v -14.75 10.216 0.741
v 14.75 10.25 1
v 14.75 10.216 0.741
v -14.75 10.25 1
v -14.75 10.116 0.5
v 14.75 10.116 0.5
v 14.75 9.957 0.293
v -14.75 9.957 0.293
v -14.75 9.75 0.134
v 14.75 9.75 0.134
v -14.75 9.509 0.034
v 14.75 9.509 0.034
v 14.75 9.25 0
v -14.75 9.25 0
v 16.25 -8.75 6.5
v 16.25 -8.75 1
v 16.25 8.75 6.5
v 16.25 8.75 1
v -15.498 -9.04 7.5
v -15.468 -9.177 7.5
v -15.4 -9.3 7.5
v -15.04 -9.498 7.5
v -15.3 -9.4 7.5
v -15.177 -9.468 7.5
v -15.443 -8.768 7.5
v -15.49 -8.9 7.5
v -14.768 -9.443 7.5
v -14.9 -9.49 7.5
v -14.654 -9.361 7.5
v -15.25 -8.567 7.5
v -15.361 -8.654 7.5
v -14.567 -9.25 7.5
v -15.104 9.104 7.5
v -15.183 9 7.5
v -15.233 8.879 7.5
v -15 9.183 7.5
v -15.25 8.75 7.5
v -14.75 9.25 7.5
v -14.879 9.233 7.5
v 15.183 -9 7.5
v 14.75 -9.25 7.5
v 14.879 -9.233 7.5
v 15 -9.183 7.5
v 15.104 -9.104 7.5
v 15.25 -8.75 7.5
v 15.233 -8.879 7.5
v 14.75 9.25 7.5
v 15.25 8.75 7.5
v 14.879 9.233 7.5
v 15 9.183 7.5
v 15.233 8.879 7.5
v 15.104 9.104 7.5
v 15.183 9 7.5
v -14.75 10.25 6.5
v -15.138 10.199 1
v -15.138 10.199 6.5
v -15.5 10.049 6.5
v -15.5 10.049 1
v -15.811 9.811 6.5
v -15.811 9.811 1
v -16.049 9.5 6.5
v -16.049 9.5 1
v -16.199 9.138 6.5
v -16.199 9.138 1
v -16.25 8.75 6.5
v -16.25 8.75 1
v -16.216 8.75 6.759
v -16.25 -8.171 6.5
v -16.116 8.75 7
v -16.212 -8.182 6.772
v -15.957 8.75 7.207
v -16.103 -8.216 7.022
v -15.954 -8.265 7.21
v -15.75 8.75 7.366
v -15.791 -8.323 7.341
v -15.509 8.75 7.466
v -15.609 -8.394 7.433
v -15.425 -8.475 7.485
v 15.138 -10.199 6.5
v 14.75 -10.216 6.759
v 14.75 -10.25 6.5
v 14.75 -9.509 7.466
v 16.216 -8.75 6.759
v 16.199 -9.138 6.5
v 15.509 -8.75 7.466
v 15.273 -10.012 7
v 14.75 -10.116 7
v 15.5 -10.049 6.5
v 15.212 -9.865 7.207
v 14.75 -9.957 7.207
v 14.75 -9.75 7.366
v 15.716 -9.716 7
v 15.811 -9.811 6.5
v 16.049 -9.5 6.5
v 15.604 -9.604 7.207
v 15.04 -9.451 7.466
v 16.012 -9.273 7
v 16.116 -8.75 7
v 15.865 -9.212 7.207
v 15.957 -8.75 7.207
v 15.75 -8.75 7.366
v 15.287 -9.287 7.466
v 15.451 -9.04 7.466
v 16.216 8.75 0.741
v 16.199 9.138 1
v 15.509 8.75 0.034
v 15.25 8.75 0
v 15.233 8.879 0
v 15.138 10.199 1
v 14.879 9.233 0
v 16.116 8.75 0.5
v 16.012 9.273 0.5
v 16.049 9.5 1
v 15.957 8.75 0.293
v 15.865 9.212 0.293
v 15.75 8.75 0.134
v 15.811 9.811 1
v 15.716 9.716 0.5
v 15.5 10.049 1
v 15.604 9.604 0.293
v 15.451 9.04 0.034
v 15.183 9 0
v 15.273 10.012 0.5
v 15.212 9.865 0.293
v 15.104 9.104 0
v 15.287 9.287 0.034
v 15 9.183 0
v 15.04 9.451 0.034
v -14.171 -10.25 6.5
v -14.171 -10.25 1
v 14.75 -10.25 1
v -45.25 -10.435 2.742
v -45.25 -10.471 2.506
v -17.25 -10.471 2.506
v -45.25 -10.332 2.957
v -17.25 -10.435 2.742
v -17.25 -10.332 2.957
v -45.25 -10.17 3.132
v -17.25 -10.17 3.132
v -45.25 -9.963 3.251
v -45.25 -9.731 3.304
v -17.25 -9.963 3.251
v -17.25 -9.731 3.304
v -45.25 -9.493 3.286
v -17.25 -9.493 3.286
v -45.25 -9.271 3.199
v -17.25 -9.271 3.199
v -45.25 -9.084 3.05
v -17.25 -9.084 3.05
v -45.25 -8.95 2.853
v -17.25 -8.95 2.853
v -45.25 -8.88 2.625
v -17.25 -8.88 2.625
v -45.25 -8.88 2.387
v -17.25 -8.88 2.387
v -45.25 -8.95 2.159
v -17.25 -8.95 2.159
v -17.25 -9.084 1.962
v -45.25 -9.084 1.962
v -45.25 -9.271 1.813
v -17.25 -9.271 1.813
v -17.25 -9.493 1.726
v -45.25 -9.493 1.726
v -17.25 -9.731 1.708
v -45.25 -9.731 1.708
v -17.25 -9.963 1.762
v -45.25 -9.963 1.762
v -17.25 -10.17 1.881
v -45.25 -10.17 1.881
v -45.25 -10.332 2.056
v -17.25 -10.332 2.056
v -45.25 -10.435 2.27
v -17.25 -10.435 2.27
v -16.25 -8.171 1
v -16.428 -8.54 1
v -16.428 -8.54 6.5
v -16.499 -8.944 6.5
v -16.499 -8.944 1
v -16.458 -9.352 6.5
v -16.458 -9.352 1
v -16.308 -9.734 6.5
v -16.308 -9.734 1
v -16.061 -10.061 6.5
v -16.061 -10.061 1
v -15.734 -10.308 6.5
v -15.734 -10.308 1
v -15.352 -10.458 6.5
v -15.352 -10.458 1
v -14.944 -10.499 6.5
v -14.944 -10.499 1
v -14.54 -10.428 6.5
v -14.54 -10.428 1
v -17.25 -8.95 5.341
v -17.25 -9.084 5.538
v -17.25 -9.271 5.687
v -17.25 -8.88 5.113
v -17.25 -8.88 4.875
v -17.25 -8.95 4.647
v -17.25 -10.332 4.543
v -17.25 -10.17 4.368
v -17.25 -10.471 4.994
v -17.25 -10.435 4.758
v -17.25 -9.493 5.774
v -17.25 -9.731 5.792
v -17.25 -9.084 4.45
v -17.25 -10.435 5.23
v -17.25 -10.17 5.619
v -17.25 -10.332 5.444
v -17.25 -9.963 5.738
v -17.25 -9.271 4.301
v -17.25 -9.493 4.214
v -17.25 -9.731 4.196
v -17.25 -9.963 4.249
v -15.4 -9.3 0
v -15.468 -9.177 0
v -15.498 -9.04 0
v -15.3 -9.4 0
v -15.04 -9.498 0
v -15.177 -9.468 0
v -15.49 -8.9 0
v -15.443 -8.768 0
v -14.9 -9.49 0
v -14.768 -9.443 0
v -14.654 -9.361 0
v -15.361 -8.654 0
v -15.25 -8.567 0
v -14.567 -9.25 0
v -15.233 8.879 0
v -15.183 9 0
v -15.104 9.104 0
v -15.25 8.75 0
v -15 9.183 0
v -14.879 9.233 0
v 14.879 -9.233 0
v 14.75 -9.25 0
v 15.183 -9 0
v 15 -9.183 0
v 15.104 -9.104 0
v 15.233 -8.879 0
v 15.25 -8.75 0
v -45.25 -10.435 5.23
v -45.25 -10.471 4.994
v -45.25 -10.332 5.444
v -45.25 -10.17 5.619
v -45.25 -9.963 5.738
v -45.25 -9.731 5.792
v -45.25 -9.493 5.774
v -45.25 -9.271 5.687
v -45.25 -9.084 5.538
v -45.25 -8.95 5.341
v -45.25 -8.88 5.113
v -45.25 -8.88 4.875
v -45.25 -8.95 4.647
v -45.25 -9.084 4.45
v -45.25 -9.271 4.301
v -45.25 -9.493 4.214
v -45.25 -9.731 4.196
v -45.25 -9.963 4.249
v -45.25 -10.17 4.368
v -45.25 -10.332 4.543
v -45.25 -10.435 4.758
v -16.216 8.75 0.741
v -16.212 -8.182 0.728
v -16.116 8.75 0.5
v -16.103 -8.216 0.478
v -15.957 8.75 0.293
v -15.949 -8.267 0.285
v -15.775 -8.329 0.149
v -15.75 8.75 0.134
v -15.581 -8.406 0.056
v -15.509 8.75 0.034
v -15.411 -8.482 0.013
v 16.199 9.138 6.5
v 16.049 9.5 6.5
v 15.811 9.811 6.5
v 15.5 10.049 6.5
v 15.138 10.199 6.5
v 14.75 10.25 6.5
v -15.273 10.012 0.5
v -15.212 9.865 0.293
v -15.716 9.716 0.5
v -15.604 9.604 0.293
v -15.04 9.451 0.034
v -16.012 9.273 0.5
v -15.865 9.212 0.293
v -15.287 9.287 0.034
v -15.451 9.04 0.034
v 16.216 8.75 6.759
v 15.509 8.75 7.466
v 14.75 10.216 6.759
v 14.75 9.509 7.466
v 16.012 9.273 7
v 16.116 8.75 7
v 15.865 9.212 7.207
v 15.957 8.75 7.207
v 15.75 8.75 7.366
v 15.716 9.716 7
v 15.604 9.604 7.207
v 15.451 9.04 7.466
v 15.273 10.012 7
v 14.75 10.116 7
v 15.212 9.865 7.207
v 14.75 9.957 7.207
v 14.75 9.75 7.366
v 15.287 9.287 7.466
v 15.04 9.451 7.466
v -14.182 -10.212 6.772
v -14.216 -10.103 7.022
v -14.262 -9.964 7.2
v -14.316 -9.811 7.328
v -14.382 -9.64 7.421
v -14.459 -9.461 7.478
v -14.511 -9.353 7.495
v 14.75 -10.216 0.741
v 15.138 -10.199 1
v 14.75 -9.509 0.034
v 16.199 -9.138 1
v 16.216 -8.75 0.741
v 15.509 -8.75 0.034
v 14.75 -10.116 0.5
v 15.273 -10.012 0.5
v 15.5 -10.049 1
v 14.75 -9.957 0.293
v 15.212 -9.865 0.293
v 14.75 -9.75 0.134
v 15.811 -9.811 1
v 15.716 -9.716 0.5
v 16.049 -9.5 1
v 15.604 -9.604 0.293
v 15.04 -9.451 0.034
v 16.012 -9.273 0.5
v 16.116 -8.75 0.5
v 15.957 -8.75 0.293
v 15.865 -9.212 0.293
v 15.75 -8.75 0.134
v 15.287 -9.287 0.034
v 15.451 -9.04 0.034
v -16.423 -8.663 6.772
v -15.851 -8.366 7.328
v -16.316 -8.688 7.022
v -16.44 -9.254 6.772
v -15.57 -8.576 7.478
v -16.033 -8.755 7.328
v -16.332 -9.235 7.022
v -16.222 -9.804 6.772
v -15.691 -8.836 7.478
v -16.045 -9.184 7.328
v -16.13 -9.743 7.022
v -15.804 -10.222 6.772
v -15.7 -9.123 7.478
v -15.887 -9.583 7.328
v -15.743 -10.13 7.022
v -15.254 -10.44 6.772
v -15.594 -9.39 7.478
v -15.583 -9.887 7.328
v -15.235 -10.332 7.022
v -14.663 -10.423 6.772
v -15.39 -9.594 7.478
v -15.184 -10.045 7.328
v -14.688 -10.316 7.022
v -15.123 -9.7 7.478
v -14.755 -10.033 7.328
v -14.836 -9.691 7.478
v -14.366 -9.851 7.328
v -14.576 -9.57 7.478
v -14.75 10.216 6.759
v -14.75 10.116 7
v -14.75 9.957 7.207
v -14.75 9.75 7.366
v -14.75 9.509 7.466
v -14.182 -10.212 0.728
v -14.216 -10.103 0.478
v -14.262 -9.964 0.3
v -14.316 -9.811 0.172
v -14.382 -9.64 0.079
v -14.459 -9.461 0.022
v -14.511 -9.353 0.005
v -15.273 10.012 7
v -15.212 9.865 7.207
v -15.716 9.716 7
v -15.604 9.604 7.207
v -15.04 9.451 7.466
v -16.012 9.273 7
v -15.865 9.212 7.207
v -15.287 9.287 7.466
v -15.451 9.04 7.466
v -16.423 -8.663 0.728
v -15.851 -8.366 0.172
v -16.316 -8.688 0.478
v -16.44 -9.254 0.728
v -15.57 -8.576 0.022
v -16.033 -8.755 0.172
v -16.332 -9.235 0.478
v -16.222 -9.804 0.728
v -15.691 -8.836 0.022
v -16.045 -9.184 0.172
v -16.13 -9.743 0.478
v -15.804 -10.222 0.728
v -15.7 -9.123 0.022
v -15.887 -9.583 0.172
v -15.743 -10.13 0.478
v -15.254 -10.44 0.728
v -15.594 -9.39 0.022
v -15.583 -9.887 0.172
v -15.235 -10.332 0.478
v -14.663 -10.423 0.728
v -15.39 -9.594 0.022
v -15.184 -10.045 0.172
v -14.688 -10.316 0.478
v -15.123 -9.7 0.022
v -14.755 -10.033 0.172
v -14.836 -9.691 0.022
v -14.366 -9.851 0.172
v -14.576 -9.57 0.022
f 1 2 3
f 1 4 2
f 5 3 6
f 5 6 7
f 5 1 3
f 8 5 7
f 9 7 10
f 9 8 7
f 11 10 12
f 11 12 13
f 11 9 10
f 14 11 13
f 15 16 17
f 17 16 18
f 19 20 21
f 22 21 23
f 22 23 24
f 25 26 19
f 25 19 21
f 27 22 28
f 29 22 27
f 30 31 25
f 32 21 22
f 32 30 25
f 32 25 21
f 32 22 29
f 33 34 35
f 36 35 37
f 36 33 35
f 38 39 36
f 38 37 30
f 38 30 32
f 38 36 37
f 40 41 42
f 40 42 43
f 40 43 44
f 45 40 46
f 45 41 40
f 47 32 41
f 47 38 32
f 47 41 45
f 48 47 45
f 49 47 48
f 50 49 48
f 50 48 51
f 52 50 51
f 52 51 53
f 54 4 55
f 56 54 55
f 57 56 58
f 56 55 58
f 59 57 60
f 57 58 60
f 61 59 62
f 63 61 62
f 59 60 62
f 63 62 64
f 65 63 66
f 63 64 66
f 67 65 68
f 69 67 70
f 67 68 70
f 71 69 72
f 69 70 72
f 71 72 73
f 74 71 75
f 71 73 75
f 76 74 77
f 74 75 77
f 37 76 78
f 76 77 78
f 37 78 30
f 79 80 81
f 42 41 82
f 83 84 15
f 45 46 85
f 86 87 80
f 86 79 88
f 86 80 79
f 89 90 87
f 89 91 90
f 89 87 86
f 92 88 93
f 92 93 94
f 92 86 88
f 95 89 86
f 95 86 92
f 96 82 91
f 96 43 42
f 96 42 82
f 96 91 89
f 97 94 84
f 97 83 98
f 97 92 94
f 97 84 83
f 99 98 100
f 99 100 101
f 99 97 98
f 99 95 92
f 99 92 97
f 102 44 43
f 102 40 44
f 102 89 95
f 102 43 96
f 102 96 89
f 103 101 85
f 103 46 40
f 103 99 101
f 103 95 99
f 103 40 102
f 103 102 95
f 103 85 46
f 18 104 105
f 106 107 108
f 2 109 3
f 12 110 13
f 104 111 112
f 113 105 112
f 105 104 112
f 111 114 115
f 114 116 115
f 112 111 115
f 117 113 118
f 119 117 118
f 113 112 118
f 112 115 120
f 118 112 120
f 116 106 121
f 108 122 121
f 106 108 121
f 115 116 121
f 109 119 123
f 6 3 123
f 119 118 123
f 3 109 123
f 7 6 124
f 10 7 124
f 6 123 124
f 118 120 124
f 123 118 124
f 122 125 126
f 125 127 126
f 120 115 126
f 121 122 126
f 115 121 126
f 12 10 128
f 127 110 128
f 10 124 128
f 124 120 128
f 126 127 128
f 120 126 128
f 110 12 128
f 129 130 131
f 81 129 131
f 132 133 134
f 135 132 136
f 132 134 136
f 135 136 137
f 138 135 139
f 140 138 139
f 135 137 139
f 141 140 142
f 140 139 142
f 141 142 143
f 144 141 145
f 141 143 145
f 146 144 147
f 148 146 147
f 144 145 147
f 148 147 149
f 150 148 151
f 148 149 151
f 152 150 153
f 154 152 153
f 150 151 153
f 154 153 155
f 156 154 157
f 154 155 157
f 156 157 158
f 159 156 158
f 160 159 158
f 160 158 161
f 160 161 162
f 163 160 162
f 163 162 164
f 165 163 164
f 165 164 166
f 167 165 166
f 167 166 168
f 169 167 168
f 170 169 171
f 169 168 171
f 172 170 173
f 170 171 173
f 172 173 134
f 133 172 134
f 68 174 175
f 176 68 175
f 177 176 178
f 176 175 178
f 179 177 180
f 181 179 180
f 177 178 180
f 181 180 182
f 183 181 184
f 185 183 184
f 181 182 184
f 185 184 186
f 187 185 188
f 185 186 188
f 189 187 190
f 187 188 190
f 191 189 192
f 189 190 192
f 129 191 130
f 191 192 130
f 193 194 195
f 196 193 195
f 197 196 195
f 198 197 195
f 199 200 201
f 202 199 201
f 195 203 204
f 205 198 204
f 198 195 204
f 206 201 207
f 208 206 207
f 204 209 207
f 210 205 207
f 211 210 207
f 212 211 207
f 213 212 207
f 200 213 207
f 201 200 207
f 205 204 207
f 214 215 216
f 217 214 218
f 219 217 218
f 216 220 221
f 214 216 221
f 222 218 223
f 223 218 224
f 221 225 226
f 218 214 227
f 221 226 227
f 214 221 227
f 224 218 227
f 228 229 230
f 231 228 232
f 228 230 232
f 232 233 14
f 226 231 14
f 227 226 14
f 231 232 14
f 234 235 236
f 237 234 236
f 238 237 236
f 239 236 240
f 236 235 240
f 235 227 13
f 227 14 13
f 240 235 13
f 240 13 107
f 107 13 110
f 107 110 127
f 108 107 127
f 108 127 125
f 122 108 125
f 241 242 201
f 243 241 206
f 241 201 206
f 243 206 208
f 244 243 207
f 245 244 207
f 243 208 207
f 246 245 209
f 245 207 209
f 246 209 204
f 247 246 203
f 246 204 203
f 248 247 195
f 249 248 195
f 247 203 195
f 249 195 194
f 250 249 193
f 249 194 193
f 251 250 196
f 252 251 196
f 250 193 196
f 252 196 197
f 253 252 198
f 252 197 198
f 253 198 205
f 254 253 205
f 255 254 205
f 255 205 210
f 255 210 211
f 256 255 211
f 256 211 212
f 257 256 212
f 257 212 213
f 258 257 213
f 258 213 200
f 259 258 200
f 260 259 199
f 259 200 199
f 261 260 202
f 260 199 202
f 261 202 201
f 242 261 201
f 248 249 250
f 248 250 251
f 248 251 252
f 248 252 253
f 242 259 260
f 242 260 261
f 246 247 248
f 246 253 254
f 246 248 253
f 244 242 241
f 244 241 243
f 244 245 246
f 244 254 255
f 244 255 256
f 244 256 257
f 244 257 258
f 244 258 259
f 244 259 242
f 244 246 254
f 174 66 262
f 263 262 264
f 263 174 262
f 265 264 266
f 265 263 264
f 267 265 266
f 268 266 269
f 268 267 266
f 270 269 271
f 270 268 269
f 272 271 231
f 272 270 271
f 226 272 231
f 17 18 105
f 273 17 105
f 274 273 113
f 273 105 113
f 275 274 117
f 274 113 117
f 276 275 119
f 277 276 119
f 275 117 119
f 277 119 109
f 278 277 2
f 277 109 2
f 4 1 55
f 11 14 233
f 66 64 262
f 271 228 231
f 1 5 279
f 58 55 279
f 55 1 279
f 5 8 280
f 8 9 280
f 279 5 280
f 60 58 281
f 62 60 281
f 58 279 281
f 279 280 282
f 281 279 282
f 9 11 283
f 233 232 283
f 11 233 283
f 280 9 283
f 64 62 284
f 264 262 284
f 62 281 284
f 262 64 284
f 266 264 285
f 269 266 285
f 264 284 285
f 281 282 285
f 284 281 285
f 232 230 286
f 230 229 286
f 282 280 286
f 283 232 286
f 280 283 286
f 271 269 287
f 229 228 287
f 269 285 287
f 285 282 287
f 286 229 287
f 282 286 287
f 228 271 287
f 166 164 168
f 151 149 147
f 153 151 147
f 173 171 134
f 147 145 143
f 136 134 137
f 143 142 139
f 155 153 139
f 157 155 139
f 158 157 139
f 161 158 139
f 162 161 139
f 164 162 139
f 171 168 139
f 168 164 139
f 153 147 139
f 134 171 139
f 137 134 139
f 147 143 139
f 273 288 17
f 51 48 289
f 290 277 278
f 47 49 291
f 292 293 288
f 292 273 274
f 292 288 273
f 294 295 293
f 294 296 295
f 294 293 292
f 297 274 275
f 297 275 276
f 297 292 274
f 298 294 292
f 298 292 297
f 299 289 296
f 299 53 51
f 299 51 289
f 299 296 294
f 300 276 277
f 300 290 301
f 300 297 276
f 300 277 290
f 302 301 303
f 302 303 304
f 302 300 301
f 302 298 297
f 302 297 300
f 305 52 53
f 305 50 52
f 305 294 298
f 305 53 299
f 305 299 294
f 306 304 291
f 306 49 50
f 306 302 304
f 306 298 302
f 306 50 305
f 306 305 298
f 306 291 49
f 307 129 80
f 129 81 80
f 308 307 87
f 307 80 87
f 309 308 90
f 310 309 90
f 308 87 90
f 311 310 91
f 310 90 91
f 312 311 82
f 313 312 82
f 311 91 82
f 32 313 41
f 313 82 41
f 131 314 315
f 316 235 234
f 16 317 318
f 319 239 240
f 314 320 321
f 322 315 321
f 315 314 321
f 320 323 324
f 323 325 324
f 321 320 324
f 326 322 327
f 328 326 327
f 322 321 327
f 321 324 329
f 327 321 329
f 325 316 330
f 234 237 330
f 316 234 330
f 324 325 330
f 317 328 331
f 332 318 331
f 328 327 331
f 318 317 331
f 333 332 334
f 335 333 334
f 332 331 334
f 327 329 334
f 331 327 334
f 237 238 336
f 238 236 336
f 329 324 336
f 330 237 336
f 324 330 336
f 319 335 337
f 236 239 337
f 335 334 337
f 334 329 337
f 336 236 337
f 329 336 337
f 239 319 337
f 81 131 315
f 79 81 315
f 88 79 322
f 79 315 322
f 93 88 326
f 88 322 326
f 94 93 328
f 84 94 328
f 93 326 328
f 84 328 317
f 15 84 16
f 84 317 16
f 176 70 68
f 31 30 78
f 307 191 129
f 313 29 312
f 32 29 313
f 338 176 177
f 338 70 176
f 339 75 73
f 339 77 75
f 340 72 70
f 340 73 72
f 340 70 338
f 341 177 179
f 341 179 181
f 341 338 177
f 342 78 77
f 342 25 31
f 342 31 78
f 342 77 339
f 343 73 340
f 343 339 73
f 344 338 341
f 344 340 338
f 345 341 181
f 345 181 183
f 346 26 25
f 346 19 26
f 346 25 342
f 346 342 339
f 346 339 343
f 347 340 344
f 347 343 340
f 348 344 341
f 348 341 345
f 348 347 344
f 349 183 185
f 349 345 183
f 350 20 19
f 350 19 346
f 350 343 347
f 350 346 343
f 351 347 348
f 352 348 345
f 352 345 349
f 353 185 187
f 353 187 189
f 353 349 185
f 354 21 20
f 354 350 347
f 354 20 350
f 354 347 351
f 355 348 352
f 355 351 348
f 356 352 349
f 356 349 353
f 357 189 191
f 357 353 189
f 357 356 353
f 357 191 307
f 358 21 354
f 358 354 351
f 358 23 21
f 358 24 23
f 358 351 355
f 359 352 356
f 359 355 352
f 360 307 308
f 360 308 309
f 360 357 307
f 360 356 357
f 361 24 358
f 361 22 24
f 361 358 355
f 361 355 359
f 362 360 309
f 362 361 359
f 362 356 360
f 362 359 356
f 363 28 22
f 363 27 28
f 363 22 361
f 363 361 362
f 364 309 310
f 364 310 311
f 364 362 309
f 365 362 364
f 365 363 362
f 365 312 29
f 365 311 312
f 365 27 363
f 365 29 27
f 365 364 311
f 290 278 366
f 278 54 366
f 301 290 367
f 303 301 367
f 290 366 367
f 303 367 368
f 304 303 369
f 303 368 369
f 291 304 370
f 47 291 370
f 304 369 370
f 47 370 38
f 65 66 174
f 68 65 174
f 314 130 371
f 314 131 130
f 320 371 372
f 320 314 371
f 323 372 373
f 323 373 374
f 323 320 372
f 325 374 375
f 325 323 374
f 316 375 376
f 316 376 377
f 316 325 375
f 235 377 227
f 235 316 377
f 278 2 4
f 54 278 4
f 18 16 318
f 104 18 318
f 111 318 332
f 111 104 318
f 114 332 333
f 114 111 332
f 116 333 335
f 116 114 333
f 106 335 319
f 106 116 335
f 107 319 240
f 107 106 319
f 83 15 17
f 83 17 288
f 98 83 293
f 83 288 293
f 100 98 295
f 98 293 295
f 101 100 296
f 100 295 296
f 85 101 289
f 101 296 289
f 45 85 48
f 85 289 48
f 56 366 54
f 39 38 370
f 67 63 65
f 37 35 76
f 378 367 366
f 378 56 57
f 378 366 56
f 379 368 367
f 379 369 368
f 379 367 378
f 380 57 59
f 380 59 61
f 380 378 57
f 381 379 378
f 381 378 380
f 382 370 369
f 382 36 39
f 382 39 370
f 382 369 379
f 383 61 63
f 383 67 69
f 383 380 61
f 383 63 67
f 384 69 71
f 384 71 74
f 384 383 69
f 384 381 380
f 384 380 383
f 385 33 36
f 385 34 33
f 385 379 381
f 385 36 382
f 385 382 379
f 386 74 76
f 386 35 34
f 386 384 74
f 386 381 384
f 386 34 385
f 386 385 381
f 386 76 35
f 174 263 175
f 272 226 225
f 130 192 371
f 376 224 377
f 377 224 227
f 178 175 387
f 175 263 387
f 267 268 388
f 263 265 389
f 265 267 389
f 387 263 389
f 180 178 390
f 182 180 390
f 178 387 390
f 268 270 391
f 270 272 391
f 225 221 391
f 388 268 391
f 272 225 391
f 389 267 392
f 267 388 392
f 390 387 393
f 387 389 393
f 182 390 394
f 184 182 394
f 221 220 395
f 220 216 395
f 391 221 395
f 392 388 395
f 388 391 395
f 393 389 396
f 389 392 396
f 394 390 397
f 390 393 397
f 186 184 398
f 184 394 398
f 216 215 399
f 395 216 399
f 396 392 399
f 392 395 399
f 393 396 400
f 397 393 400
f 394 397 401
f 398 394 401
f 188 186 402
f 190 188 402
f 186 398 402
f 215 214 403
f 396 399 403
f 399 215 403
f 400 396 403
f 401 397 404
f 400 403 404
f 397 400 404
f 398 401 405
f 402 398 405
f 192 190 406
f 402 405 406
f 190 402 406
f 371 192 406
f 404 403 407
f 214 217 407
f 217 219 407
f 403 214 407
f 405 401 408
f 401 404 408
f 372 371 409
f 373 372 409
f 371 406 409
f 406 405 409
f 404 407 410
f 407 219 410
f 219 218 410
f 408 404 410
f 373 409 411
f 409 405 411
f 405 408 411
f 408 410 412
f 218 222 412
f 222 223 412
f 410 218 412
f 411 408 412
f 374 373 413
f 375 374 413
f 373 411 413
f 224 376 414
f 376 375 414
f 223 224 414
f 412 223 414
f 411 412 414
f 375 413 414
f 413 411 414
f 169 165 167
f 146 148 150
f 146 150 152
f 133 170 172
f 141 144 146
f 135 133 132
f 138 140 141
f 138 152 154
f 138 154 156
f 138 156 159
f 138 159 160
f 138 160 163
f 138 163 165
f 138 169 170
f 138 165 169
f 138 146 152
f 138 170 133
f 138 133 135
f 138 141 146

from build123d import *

# Parameters (mm, degrees)
F1_DEPTH = 7.5
F2_R     = 1
F4_R     = 0.8
F5_DEPTH = 28


with BuildPart() as f1:
    # F0 (on Top) → F1 (new body)
    with BuildSketch(Plane.XY):
        with BuildLine():
            ThreePointArc((16.25, 8.75), (15.8106601718, 9.8106601718), (14.75, 10.25))
            Line((14.75, 10.25), (-14.75, 10.25))
            ThreePointArc((-14.75, 10.25), (-15.8106601718, 9.8106601718), (-16.25, 8.75))
            Line((-16.25, 8.75), (-16.25, -8.1708438024))
            ThreePointArc((-16.25, -8.1708438024), (-16.0606601718, -10.0606601718), (-14.1708438024, -10.25))
            Line((-14.1708438024, -10.25), (14.75, -10.25))
            ThreePointArc((14.75, -10.25), (15.8106601718, -9.8106601718), (16.25, -8.75))
            Line((16.25, -8.75), (16.25, 8.75))
        make_face()
    extrude(amount=F1_DEPTH)

    # F2
    f2_edges = [f1.edges().sort_by_distance(p)[0] for p in [
        (15.81066, 9.81066, 7.5),
        (0, 10.25, 7.5),
        (-15.81066, 9.81066, 7.5),
        (-16.25, 0.289578, 7.5),
        (-16.06066, -10.06066, 7.5),
        (0.289578, -10.25, 7.5),
        (15.81066, -9.81066, 7.5),
        (16.25, 0, 7.5),
        (15.81066, 9.81066, 0),
        (0, 10.25, 0),
        (-15.81066, 9.81066, 0),
        (-16.25, 0.289578, 0),
        (-16.06066, -10.06066, 0),
        (0.289578, -10.25, 0),
        (15.81066, -9.81066, 0),
        (16.25, 0, 0),
    ]]
    fillet(f2_edges, radius=F2_R)


with BuildPart() as f5:
    # F4 (on offset) → F5 (new body)
    with BuildSketch(Plane(origin=(-17.25, 0, 0), x_dir=(0, -1, 0), z_dir=(-1, 0, 0))):
        with Locations((9.6708438024, 2.5062605273)):
            Circle(F4_R)
    extrude(amount=F5_DEPTH)


with BuildPart() as f5b:
    # F4 (on offset) → F5, piece 2 (new body)
    with BuildSketch(Plane(origin=(-17.25, 0, 0), x_dir=(0, -1, 0), z_dir=(-1, 0, 0))):
        with Locations((9.6708438024, 4.9937394727)):
            Circle(F4_R)
    extrude(amount=F5_DEPTH)


solid = Compound([f1.part, f5.part, f5b.part])
